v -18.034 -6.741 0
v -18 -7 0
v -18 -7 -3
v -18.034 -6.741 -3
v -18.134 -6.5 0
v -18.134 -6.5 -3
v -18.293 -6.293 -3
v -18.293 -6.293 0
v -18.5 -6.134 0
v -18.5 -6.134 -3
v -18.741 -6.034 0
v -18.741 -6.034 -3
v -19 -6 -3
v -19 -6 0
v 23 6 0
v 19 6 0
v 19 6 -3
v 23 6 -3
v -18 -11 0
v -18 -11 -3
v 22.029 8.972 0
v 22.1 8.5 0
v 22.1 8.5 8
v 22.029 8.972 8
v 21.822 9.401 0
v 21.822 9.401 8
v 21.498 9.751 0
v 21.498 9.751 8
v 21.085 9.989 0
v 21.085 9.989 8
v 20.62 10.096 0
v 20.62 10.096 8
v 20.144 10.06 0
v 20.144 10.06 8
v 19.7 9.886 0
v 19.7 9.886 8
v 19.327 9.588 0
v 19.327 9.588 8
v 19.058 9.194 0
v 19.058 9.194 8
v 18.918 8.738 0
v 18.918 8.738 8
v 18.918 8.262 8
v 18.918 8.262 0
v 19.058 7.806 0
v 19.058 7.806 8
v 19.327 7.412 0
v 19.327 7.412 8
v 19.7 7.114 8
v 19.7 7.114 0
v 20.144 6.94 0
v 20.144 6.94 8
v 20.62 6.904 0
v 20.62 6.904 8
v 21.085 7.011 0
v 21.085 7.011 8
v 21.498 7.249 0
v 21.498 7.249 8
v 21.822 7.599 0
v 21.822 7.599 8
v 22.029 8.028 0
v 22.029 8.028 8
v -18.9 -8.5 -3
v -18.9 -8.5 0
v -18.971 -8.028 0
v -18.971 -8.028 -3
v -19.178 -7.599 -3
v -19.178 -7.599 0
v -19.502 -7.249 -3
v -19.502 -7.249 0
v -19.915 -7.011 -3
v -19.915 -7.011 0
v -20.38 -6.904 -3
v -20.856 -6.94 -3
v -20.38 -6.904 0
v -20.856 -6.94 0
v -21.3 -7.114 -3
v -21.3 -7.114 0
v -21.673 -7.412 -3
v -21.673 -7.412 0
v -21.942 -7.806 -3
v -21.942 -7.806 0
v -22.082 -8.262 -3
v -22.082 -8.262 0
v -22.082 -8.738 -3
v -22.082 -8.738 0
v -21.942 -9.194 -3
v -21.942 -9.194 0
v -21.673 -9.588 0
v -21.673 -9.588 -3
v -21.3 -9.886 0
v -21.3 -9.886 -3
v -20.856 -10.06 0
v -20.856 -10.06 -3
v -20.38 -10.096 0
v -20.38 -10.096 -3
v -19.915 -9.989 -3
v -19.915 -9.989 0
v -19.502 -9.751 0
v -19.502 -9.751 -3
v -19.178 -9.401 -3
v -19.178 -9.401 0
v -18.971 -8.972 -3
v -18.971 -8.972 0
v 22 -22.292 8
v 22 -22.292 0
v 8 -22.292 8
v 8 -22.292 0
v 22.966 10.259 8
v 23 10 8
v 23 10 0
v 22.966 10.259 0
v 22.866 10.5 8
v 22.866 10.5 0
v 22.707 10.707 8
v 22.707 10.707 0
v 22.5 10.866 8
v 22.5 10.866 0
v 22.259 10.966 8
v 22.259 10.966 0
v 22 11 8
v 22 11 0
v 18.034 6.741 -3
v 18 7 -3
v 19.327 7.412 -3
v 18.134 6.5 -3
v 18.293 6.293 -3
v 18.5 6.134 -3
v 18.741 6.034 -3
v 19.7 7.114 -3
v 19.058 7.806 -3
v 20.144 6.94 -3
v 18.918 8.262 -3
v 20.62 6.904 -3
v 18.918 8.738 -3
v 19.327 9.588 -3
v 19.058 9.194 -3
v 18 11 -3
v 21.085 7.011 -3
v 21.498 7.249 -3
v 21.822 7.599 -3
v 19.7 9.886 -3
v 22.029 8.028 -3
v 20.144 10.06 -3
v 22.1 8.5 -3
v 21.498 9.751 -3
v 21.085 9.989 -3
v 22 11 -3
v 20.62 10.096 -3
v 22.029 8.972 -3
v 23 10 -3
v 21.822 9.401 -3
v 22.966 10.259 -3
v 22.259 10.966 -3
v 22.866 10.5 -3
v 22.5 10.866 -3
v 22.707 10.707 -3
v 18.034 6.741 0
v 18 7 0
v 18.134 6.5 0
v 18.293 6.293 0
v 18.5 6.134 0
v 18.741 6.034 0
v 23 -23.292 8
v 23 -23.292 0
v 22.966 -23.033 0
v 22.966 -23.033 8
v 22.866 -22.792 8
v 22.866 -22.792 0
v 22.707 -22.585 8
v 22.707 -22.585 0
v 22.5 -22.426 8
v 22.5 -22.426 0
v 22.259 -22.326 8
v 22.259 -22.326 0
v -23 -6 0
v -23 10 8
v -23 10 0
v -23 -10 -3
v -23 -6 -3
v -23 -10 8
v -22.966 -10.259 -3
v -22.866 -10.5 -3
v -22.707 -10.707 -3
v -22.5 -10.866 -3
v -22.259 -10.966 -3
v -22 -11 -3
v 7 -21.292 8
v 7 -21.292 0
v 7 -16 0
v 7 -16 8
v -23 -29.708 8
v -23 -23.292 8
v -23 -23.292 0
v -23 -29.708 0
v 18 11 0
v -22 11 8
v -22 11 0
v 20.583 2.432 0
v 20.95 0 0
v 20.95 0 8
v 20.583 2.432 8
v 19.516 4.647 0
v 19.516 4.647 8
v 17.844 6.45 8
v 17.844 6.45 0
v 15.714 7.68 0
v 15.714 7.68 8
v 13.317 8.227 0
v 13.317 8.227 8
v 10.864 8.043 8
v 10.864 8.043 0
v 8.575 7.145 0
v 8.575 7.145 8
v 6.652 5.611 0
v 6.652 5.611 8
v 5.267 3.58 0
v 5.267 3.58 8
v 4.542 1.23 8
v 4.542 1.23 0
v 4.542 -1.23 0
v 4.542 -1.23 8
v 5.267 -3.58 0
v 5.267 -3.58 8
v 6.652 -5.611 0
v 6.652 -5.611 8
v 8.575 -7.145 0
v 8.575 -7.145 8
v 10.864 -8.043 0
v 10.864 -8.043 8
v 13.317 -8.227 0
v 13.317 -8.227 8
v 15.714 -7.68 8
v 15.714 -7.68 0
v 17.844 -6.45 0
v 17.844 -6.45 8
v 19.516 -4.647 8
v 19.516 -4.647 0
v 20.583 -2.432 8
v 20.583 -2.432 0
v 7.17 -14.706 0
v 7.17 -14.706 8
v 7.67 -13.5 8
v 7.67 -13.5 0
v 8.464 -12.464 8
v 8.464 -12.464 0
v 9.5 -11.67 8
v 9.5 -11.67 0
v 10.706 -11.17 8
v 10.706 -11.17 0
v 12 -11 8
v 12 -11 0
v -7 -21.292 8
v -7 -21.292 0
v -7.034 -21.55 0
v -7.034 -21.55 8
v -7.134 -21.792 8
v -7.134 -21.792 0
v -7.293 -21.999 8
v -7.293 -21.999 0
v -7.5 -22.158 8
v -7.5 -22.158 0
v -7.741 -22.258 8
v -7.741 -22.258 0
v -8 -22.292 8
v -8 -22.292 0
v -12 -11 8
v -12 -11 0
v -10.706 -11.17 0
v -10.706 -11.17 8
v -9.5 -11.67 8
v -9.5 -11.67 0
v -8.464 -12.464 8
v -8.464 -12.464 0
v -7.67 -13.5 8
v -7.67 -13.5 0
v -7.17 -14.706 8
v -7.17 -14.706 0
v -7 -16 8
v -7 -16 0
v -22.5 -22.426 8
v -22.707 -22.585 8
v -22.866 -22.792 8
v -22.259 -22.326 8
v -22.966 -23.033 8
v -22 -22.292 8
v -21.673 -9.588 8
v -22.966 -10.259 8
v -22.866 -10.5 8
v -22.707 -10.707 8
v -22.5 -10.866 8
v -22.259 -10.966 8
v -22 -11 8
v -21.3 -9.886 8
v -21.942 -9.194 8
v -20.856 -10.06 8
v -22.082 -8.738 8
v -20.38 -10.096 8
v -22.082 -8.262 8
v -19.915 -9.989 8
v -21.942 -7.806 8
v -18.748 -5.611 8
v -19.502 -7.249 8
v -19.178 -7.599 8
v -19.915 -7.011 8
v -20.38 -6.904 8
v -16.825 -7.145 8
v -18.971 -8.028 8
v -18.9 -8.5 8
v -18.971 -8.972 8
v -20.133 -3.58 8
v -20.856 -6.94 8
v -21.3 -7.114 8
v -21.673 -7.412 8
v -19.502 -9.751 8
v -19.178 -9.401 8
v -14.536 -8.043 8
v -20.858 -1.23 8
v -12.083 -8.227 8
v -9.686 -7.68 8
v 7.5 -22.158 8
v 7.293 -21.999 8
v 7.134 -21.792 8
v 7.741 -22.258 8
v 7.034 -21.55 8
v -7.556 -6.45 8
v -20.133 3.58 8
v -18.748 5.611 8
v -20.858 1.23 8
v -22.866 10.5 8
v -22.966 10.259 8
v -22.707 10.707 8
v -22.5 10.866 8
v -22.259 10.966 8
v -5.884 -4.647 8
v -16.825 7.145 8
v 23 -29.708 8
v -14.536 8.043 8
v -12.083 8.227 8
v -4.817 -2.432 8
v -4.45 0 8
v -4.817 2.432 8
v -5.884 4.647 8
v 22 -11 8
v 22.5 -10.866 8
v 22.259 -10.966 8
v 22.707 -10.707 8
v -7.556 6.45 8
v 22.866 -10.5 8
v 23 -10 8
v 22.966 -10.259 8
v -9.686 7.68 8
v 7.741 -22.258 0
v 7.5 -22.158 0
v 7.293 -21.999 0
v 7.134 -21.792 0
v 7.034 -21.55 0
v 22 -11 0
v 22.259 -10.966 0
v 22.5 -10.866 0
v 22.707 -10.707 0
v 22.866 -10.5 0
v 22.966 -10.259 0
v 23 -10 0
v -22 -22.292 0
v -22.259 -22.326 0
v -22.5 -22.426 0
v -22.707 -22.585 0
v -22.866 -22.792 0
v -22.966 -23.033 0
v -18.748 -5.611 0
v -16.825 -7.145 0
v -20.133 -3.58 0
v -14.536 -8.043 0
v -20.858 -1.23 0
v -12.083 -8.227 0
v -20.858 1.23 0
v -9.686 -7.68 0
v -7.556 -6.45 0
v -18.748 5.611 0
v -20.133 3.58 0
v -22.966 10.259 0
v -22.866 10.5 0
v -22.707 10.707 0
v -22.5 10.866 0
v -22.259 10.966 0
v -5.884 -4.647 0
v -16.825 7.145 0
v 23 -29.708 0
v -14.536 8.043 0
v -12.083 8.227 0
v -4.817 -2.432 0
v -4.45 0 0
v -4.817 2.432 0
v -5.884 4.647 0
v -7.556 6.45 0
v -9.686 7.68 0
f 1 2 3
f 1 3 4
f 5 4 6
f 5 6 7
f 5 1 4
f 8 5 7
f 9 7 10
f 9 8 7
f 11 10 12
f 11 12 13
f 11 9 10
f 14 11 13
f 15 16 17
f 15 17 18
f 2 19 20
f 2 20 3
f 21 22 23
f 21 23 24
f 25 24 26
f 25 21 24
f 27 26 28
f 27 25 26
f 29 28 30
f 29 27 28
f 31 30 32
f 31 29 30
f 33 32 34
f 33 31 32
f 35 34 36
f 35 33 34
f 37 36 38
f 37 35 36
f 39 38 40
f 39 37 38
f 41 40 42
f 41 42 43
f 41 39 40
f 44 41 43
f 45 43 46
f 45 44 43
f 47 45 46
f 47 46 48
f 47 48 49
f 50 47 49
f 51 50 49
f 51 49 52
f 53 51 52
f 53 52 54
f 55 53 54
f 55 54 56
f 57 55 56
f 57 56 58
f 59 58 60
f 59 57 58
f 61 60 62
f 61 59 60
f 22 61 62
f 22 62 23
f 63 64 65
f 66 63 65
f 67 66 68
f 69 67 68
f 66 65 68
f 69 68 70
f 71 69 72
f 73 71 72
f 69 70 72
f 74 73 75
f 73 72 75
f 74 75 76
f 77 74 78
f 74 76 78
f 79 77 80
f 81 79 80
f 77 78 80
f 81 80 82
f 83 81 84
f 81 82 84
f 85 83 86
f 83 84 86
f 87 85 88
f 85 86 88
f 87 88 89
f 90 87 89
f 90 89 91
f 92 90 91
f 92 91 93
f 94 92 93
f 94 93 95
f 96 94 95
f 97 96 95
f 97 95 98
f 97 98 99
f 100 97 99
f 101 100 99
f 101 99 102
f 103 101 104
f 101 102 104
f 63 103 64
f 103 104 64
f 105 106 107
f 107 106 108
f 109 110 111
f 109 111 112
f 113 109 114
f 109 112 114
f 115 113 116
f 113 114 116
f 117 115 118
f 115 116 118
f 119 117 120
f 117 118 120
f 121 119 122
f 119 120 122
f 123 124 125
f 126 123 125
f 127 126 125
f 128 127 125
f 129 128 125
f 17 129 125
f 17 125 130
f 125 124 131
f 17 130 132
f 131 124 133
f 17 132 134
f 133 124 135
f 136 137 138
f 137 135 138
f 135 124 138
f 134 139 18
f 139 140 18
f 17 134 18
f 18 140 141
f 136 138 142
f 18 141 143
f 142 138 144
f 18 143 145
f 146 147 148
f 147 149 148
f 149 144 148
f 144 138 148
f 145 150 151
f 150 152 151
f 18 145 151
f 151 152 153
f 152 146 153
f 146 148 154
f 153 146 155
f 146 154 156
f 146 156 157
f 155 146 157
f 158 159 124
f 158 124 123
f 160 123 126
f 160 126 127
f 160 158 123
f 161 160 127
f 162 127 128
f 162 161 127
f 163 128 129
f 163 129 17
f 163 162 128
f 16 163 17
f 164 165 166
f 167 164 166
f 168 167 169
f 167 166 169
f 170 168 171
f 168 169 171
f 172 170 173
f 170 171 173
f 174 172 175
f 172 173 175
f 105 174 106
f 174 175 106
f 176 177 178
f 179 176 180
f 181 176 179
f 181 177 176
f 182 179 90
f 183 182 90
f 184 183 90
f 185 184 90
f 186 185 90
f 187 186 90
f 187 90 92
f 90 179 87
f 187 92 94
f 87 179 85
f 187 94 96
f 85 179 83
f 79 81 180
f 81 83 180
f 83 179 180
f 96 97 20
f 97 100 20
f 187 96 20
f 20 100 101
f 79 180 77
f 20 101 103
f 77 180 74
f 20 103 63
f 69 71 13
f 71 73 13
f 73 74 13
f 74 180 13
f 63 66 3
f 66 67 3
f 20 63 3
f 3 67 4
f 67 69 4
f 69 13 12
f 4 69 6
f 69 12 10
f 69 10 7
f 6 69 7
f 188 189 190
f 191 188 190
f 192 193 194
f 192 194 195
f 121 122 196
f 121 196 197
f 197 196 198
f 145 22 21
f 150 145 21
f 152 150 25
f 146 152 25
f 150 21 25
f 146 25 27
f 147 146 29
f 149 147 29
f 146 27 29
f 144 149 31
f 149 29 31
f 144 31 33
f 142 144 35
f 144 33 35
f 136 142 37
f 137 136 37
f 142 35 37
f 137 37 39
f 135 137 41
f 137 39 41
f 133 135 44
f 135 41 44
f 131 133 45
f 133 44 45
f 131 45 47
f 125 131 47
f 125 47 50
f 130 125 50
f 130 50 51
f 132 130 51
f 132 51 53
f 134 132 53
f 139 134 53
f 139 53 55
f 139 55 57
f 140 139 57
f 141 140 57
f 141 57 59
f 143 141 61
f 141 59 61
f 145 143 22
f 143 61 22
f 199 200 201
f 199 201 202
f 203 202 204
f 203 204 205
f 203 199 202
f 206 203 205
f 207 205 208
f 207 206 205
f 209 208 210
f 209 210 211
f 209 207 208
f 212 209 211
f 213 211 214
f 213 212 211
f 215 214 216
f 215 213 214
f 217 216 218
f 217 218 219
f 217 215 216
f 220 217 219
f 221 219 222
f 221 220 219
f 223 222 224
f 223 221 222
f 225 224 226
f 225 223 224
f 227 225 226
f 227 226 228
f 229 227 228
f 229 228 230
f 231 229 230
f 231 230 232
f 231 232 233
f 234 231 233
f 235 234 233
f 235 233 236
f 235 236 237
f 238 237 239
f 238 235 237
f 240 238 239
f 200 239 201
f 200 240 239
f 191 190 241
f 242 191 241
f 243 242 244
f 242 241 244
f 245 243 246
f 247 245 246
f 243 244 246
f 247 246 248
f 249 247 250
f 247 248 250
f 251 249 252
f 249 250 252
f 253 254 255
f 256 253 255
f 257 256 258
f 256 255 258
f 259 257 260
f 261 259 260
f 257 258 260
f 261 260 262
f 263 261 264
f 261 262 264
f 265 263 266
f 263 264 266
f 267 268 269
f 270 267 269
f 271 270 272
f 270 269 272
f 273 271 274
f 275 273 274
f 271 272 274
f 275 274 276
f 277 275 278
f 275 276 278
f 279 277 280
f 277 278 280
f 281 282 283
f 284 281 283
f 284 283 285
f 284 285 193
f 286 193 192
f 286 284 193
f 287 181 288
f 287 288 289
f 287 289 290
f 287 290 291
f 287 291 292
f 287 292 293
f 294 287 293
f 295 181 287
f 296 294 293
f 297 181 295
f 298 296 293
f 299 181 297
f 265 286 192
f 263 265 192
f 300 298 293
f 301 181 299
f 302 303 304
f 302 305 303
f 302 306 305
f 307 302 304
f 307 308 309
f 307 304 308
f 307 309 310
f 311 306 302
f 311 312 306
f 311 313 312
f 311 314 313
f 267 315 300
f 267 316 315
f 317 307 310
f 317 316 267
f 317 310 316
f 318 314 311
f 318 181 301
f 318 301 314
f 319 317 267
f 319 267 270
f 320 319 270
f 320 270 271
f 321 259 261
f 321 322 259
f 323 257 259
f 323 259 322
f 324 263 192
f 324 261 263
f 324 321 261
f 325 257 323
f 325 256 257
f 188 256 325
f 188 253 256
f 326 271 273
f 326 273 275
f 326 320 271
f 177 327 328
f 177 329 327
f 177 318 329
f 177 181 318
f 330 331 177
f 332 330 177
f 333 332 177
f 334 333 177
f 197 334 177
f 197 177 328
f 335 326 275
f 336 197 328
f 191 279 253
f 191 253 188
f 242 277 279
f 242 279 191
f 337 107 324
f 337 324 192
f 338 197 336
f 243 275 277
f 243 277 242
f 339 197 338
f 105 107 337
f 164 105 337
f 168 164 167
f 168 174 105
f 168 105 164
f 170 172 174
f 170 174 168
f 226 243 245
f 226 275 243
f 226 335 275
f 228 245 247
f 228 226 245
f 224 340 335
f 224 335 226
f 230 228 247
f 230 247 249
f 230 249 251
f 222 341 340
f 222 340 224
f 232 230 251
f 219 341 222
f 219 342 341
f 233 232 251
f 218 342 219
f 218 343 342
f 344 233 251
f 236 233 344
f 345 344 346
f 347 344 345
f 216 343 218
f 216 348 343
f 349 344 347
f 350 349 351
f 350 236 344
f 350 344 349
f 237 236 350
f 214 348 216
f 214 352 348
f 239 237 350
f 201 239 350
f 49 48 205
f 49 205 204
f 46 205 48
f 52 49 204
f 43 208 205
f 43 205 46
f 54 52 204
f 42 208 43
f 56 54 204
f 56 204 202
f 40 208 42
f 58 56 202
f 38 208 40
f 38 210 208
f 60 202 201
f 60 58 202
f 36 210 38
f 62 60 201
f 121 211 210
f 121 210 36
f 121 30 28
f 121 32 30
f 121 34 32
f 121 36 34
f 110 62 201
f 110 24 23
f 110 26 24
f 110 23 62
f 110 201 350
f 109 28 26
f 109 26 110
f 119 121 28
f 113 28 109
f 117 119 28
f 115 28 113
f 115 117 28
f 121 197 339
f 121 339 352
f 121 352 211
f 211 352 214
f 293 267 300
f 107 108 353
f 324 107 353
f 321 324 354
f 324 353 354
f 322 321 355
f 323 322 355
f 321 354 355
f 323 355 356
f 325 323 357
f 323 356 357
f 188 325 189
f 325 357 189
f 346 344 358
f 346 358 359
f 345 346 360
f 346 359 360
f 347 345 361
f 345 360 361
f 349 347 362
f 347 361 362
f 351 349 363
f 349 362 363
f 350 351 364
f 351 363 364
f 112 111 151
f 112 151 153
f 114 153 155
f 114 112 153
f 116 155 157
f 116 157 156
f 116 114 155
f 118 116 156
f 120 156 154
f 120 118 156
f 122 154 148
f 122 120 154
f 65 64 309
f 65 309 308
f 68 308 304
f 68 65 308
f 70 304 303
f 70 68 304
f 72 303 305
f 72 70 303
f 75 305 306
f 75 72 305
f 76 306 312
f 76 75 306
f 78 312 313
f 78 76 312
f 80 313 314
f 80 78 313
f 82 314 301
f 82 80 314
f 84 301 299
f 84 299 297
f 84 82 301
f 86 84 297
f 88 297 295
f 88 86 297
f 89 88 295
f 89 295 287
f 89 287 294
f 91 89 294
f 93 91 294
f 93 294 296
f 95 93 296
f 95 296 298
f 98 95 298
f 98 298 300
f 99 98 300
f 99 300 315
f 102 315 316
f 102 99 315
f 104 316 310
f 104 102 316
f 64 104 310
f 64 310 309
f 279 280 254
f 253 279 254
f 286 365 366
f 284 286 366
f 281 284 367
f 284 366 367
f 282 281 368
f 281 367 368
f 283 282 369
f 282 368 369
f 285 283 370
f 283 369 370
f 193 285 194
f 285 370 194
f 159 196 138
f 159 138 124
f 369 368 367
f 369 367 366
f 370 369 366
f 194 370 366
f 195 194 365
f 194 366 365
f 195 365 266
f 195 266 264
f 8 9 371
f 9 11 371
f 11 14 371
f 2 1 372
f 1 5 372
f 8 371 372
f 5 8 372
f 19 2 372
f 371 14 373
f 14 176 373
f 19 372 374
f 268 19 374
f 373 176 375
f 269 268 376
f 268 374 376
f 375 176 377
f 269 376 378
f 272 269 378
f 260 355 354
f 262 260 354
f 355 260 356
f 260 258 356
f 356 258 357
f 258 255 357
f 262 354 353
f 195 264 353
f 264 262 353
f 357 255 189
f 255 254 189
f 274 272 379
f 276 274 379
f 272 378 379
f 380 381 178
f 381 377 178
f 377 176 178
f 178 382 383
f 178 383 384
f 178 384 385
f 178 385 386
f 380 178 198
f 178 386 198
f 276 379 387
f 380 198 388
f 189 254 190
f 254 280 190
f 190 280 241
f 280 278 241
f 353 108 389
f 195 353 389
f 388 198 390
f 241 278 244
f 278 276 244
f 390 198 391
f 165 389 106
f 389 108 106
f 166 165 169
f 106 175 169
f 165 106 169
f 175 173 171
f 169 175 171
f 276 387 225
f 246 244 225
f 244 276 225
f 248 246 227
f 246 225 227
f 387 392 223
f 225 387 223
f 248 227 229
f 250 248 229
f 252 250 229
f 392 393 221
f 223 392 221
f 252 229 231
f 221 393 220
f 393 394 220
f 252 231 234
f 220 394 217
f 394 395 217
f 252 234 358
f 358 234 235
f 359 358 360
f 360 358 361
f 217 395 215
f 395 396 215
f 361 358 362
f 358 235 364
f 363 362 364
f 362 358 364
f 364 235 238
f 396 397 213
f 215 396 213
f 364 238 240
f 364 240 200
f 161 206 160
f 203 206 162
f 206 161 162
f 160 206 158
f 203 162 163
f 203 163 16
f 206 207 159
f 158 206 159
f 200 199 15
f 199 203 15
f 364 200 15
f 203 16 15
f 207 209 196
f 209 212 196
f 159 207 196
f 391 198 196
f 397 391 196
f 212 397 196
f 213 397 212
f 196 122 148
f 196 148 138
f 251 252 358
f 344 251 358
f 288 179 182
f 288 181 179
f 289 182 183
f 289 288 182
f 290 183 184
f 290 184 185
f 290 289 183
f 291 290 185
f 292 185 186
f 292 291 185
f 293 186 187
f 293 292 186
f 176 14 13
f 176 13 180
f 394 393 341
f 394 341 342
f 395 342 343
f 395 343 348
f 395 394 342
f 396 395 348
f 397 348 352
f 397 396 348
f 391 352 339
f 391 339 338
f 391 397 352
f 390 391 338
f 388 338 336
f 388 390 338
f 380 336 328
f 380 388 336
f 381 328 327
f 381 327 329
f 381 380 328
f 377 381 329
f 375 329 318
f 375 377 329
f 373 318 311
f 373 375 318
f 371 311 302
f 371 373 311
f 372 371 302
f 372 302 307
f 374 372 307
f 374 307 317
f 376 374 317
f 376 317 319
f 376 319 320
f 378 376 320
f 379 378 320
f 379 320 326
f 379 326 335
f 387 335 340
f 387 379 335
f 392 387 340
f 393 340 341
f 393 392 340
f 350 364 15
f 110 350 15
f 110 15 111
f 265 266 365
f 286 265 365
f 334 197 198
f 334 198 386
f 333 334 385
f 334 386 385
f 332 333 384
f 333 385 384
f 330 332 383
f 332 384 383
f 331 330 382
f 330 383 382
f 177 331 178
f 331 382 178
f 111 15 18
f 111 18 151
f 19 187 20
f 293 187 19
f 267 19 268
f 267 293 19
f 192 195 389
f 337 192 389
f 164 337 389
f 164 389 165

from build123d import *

# Parameters (mm, degrees)
F0_R     = 8.25
F0_R_2   = 1.6
F1_DEPTH = 8
F2_DEPTH = 3


with BuildPart() as f1:
    # F0 (on Top) → F1 (new body)
    with BuildSketch(Plane.XY):
        with BuildLine():
            Line((-23, -29.708343), (23, -29.708343))
            Line((23, -29.708343), (23, -23.291657))
            ThreePointArc((23, -23.291657), (22.707107, -22.58455), (22, -22.291657))
            Line((22, -22.291657), (8, -22.291657))
            ThreePointArc((8, -22.291657), (7.292893, -21.998763), (7, -21.291657))
            Line((7, -21.291657), (7, -16))
            ThreePointArc((7, -16), (8.464466, -12.464466), (12, -11))
            Line((12, -11), (22, -11))
            ThreePointArc((22, -11), (22.707107, -10.707107), (23, -10))
            Line((23, -10), (23, 6))
            Line((23, 6), (19, 6))
            ThreePointArc((19, 6), (18.292893, 6.292893), (18, 7))
            Line((18, 7), (18, 11))
            Line((18, 11), (-22, 11))
            ThreePointArc((-22, 11), (-22.707107, 10.707107), (-23, 10))
            Line((-23, 10), (-23, -6))
            Line((-23, -6), (-19, -6))
            ThreePointArc((-19, -6), (-18.292893, -6.292893), (-18, -7))
            Line((-18, -7), (-18, -11))
            Line((-18, -11), (-12, -11))
            ThreePointArc((-12, -11), (-8.464466, -12.464466), (-7, -16))
            Line((-7, -16), (-7, -21.291657))
            ThreePointArc((-7, -21.291657), (-7.292893, -21.998763), (-8, -22.291657))
            Line((-8, -22.291657), (-22, -22.291657))
            ThreePointArc((-22, -22.291657), (-22.707107, -22.58455), (-23, -23.291657))
            Line((-23, -23.291657), (-23, -29.708343))
        make_face()
        with Locations((-12.7, 0)):
            Circle(F0_R, mode=Mode.SUBTRACT)
        with Locations((12.7, 0)):
            Circle(F0_R, mode=Mode.SUBTRACT)
        with BuildLine():
            Line((19, 6), (23, 6))
            Line((23, 6), (23, 10))
            ThreePointArc((23, 10), (22.707107, 10.707107), (22, 11))
            Line((22, 11), (18, 11))
            Line((18, 11), (18, 7))
            ThreePointArc((18, 7), (18.292893, 6.292893), (19, 6))
        make_face()
        with Locations((20.5, 8.5)):
            Circle(F0_R_2, mode=Mode.SUBTRACT)
        with BuildLine():
            Line((-22, -11), (-18, -11))
            Line((-18, -11), (-18, -7))
            ThreePointArc((-18, -7), (-18.292893, -6.292893), (-19, -6))
            Line((-19, -6), (-23, -6))
            Line((-23, -6), (-23, -10))
            ThreePointArc((-23, -10), (-22.707107, -10.707107), (-22, -11))
        make_face()
        with Locations((-20.5, -8.5)):
            Circle(F0_R_2, mode=Mode.SUBTRACT)
    extrude(amount=F1_DEPTH)

    # F0 (on Top) → F2 (join)
    with BuildSketch(Plane.XY):
        with BuildLine():
            Line((-22, -11), (-18, -11))
            Line((-18, -11), (-18, -7))
            ThreePointArc((-18, -7), (-18.292893, -6.292893), (-19, -6))
            Line((-19, -6), (-23, -6))
            Line((-23, -6), (-23, -10))
            ThreePointArc((-23, -10), (-22.707107, -10.707107), (-22, -11))
        make_face()
        with Locations((-20.5, -8.5)):
            Circle(F0_R_2, mode=Mode.SUBTRACT)
        with BuildLine():
            Line((19, 6), (23, 6))
            Line((23, 6), (23, 10))
            ThreePointArc((23, 10), (22.707107, 10.707107), (22, 11))
            Line((22, 11), (18, 11))
            Line((18, 11), (18, 7))
            ThreePointArc((18, 7), (18.292893, 6.292893), (19, 6))
        make_face()
        with Locations((20.5, 8.5)):
            Circle(F0_R_2, mode=Mode.SUBTRACT)
    extrude(amount=-F2_DEPTH)


solid = f1.part
